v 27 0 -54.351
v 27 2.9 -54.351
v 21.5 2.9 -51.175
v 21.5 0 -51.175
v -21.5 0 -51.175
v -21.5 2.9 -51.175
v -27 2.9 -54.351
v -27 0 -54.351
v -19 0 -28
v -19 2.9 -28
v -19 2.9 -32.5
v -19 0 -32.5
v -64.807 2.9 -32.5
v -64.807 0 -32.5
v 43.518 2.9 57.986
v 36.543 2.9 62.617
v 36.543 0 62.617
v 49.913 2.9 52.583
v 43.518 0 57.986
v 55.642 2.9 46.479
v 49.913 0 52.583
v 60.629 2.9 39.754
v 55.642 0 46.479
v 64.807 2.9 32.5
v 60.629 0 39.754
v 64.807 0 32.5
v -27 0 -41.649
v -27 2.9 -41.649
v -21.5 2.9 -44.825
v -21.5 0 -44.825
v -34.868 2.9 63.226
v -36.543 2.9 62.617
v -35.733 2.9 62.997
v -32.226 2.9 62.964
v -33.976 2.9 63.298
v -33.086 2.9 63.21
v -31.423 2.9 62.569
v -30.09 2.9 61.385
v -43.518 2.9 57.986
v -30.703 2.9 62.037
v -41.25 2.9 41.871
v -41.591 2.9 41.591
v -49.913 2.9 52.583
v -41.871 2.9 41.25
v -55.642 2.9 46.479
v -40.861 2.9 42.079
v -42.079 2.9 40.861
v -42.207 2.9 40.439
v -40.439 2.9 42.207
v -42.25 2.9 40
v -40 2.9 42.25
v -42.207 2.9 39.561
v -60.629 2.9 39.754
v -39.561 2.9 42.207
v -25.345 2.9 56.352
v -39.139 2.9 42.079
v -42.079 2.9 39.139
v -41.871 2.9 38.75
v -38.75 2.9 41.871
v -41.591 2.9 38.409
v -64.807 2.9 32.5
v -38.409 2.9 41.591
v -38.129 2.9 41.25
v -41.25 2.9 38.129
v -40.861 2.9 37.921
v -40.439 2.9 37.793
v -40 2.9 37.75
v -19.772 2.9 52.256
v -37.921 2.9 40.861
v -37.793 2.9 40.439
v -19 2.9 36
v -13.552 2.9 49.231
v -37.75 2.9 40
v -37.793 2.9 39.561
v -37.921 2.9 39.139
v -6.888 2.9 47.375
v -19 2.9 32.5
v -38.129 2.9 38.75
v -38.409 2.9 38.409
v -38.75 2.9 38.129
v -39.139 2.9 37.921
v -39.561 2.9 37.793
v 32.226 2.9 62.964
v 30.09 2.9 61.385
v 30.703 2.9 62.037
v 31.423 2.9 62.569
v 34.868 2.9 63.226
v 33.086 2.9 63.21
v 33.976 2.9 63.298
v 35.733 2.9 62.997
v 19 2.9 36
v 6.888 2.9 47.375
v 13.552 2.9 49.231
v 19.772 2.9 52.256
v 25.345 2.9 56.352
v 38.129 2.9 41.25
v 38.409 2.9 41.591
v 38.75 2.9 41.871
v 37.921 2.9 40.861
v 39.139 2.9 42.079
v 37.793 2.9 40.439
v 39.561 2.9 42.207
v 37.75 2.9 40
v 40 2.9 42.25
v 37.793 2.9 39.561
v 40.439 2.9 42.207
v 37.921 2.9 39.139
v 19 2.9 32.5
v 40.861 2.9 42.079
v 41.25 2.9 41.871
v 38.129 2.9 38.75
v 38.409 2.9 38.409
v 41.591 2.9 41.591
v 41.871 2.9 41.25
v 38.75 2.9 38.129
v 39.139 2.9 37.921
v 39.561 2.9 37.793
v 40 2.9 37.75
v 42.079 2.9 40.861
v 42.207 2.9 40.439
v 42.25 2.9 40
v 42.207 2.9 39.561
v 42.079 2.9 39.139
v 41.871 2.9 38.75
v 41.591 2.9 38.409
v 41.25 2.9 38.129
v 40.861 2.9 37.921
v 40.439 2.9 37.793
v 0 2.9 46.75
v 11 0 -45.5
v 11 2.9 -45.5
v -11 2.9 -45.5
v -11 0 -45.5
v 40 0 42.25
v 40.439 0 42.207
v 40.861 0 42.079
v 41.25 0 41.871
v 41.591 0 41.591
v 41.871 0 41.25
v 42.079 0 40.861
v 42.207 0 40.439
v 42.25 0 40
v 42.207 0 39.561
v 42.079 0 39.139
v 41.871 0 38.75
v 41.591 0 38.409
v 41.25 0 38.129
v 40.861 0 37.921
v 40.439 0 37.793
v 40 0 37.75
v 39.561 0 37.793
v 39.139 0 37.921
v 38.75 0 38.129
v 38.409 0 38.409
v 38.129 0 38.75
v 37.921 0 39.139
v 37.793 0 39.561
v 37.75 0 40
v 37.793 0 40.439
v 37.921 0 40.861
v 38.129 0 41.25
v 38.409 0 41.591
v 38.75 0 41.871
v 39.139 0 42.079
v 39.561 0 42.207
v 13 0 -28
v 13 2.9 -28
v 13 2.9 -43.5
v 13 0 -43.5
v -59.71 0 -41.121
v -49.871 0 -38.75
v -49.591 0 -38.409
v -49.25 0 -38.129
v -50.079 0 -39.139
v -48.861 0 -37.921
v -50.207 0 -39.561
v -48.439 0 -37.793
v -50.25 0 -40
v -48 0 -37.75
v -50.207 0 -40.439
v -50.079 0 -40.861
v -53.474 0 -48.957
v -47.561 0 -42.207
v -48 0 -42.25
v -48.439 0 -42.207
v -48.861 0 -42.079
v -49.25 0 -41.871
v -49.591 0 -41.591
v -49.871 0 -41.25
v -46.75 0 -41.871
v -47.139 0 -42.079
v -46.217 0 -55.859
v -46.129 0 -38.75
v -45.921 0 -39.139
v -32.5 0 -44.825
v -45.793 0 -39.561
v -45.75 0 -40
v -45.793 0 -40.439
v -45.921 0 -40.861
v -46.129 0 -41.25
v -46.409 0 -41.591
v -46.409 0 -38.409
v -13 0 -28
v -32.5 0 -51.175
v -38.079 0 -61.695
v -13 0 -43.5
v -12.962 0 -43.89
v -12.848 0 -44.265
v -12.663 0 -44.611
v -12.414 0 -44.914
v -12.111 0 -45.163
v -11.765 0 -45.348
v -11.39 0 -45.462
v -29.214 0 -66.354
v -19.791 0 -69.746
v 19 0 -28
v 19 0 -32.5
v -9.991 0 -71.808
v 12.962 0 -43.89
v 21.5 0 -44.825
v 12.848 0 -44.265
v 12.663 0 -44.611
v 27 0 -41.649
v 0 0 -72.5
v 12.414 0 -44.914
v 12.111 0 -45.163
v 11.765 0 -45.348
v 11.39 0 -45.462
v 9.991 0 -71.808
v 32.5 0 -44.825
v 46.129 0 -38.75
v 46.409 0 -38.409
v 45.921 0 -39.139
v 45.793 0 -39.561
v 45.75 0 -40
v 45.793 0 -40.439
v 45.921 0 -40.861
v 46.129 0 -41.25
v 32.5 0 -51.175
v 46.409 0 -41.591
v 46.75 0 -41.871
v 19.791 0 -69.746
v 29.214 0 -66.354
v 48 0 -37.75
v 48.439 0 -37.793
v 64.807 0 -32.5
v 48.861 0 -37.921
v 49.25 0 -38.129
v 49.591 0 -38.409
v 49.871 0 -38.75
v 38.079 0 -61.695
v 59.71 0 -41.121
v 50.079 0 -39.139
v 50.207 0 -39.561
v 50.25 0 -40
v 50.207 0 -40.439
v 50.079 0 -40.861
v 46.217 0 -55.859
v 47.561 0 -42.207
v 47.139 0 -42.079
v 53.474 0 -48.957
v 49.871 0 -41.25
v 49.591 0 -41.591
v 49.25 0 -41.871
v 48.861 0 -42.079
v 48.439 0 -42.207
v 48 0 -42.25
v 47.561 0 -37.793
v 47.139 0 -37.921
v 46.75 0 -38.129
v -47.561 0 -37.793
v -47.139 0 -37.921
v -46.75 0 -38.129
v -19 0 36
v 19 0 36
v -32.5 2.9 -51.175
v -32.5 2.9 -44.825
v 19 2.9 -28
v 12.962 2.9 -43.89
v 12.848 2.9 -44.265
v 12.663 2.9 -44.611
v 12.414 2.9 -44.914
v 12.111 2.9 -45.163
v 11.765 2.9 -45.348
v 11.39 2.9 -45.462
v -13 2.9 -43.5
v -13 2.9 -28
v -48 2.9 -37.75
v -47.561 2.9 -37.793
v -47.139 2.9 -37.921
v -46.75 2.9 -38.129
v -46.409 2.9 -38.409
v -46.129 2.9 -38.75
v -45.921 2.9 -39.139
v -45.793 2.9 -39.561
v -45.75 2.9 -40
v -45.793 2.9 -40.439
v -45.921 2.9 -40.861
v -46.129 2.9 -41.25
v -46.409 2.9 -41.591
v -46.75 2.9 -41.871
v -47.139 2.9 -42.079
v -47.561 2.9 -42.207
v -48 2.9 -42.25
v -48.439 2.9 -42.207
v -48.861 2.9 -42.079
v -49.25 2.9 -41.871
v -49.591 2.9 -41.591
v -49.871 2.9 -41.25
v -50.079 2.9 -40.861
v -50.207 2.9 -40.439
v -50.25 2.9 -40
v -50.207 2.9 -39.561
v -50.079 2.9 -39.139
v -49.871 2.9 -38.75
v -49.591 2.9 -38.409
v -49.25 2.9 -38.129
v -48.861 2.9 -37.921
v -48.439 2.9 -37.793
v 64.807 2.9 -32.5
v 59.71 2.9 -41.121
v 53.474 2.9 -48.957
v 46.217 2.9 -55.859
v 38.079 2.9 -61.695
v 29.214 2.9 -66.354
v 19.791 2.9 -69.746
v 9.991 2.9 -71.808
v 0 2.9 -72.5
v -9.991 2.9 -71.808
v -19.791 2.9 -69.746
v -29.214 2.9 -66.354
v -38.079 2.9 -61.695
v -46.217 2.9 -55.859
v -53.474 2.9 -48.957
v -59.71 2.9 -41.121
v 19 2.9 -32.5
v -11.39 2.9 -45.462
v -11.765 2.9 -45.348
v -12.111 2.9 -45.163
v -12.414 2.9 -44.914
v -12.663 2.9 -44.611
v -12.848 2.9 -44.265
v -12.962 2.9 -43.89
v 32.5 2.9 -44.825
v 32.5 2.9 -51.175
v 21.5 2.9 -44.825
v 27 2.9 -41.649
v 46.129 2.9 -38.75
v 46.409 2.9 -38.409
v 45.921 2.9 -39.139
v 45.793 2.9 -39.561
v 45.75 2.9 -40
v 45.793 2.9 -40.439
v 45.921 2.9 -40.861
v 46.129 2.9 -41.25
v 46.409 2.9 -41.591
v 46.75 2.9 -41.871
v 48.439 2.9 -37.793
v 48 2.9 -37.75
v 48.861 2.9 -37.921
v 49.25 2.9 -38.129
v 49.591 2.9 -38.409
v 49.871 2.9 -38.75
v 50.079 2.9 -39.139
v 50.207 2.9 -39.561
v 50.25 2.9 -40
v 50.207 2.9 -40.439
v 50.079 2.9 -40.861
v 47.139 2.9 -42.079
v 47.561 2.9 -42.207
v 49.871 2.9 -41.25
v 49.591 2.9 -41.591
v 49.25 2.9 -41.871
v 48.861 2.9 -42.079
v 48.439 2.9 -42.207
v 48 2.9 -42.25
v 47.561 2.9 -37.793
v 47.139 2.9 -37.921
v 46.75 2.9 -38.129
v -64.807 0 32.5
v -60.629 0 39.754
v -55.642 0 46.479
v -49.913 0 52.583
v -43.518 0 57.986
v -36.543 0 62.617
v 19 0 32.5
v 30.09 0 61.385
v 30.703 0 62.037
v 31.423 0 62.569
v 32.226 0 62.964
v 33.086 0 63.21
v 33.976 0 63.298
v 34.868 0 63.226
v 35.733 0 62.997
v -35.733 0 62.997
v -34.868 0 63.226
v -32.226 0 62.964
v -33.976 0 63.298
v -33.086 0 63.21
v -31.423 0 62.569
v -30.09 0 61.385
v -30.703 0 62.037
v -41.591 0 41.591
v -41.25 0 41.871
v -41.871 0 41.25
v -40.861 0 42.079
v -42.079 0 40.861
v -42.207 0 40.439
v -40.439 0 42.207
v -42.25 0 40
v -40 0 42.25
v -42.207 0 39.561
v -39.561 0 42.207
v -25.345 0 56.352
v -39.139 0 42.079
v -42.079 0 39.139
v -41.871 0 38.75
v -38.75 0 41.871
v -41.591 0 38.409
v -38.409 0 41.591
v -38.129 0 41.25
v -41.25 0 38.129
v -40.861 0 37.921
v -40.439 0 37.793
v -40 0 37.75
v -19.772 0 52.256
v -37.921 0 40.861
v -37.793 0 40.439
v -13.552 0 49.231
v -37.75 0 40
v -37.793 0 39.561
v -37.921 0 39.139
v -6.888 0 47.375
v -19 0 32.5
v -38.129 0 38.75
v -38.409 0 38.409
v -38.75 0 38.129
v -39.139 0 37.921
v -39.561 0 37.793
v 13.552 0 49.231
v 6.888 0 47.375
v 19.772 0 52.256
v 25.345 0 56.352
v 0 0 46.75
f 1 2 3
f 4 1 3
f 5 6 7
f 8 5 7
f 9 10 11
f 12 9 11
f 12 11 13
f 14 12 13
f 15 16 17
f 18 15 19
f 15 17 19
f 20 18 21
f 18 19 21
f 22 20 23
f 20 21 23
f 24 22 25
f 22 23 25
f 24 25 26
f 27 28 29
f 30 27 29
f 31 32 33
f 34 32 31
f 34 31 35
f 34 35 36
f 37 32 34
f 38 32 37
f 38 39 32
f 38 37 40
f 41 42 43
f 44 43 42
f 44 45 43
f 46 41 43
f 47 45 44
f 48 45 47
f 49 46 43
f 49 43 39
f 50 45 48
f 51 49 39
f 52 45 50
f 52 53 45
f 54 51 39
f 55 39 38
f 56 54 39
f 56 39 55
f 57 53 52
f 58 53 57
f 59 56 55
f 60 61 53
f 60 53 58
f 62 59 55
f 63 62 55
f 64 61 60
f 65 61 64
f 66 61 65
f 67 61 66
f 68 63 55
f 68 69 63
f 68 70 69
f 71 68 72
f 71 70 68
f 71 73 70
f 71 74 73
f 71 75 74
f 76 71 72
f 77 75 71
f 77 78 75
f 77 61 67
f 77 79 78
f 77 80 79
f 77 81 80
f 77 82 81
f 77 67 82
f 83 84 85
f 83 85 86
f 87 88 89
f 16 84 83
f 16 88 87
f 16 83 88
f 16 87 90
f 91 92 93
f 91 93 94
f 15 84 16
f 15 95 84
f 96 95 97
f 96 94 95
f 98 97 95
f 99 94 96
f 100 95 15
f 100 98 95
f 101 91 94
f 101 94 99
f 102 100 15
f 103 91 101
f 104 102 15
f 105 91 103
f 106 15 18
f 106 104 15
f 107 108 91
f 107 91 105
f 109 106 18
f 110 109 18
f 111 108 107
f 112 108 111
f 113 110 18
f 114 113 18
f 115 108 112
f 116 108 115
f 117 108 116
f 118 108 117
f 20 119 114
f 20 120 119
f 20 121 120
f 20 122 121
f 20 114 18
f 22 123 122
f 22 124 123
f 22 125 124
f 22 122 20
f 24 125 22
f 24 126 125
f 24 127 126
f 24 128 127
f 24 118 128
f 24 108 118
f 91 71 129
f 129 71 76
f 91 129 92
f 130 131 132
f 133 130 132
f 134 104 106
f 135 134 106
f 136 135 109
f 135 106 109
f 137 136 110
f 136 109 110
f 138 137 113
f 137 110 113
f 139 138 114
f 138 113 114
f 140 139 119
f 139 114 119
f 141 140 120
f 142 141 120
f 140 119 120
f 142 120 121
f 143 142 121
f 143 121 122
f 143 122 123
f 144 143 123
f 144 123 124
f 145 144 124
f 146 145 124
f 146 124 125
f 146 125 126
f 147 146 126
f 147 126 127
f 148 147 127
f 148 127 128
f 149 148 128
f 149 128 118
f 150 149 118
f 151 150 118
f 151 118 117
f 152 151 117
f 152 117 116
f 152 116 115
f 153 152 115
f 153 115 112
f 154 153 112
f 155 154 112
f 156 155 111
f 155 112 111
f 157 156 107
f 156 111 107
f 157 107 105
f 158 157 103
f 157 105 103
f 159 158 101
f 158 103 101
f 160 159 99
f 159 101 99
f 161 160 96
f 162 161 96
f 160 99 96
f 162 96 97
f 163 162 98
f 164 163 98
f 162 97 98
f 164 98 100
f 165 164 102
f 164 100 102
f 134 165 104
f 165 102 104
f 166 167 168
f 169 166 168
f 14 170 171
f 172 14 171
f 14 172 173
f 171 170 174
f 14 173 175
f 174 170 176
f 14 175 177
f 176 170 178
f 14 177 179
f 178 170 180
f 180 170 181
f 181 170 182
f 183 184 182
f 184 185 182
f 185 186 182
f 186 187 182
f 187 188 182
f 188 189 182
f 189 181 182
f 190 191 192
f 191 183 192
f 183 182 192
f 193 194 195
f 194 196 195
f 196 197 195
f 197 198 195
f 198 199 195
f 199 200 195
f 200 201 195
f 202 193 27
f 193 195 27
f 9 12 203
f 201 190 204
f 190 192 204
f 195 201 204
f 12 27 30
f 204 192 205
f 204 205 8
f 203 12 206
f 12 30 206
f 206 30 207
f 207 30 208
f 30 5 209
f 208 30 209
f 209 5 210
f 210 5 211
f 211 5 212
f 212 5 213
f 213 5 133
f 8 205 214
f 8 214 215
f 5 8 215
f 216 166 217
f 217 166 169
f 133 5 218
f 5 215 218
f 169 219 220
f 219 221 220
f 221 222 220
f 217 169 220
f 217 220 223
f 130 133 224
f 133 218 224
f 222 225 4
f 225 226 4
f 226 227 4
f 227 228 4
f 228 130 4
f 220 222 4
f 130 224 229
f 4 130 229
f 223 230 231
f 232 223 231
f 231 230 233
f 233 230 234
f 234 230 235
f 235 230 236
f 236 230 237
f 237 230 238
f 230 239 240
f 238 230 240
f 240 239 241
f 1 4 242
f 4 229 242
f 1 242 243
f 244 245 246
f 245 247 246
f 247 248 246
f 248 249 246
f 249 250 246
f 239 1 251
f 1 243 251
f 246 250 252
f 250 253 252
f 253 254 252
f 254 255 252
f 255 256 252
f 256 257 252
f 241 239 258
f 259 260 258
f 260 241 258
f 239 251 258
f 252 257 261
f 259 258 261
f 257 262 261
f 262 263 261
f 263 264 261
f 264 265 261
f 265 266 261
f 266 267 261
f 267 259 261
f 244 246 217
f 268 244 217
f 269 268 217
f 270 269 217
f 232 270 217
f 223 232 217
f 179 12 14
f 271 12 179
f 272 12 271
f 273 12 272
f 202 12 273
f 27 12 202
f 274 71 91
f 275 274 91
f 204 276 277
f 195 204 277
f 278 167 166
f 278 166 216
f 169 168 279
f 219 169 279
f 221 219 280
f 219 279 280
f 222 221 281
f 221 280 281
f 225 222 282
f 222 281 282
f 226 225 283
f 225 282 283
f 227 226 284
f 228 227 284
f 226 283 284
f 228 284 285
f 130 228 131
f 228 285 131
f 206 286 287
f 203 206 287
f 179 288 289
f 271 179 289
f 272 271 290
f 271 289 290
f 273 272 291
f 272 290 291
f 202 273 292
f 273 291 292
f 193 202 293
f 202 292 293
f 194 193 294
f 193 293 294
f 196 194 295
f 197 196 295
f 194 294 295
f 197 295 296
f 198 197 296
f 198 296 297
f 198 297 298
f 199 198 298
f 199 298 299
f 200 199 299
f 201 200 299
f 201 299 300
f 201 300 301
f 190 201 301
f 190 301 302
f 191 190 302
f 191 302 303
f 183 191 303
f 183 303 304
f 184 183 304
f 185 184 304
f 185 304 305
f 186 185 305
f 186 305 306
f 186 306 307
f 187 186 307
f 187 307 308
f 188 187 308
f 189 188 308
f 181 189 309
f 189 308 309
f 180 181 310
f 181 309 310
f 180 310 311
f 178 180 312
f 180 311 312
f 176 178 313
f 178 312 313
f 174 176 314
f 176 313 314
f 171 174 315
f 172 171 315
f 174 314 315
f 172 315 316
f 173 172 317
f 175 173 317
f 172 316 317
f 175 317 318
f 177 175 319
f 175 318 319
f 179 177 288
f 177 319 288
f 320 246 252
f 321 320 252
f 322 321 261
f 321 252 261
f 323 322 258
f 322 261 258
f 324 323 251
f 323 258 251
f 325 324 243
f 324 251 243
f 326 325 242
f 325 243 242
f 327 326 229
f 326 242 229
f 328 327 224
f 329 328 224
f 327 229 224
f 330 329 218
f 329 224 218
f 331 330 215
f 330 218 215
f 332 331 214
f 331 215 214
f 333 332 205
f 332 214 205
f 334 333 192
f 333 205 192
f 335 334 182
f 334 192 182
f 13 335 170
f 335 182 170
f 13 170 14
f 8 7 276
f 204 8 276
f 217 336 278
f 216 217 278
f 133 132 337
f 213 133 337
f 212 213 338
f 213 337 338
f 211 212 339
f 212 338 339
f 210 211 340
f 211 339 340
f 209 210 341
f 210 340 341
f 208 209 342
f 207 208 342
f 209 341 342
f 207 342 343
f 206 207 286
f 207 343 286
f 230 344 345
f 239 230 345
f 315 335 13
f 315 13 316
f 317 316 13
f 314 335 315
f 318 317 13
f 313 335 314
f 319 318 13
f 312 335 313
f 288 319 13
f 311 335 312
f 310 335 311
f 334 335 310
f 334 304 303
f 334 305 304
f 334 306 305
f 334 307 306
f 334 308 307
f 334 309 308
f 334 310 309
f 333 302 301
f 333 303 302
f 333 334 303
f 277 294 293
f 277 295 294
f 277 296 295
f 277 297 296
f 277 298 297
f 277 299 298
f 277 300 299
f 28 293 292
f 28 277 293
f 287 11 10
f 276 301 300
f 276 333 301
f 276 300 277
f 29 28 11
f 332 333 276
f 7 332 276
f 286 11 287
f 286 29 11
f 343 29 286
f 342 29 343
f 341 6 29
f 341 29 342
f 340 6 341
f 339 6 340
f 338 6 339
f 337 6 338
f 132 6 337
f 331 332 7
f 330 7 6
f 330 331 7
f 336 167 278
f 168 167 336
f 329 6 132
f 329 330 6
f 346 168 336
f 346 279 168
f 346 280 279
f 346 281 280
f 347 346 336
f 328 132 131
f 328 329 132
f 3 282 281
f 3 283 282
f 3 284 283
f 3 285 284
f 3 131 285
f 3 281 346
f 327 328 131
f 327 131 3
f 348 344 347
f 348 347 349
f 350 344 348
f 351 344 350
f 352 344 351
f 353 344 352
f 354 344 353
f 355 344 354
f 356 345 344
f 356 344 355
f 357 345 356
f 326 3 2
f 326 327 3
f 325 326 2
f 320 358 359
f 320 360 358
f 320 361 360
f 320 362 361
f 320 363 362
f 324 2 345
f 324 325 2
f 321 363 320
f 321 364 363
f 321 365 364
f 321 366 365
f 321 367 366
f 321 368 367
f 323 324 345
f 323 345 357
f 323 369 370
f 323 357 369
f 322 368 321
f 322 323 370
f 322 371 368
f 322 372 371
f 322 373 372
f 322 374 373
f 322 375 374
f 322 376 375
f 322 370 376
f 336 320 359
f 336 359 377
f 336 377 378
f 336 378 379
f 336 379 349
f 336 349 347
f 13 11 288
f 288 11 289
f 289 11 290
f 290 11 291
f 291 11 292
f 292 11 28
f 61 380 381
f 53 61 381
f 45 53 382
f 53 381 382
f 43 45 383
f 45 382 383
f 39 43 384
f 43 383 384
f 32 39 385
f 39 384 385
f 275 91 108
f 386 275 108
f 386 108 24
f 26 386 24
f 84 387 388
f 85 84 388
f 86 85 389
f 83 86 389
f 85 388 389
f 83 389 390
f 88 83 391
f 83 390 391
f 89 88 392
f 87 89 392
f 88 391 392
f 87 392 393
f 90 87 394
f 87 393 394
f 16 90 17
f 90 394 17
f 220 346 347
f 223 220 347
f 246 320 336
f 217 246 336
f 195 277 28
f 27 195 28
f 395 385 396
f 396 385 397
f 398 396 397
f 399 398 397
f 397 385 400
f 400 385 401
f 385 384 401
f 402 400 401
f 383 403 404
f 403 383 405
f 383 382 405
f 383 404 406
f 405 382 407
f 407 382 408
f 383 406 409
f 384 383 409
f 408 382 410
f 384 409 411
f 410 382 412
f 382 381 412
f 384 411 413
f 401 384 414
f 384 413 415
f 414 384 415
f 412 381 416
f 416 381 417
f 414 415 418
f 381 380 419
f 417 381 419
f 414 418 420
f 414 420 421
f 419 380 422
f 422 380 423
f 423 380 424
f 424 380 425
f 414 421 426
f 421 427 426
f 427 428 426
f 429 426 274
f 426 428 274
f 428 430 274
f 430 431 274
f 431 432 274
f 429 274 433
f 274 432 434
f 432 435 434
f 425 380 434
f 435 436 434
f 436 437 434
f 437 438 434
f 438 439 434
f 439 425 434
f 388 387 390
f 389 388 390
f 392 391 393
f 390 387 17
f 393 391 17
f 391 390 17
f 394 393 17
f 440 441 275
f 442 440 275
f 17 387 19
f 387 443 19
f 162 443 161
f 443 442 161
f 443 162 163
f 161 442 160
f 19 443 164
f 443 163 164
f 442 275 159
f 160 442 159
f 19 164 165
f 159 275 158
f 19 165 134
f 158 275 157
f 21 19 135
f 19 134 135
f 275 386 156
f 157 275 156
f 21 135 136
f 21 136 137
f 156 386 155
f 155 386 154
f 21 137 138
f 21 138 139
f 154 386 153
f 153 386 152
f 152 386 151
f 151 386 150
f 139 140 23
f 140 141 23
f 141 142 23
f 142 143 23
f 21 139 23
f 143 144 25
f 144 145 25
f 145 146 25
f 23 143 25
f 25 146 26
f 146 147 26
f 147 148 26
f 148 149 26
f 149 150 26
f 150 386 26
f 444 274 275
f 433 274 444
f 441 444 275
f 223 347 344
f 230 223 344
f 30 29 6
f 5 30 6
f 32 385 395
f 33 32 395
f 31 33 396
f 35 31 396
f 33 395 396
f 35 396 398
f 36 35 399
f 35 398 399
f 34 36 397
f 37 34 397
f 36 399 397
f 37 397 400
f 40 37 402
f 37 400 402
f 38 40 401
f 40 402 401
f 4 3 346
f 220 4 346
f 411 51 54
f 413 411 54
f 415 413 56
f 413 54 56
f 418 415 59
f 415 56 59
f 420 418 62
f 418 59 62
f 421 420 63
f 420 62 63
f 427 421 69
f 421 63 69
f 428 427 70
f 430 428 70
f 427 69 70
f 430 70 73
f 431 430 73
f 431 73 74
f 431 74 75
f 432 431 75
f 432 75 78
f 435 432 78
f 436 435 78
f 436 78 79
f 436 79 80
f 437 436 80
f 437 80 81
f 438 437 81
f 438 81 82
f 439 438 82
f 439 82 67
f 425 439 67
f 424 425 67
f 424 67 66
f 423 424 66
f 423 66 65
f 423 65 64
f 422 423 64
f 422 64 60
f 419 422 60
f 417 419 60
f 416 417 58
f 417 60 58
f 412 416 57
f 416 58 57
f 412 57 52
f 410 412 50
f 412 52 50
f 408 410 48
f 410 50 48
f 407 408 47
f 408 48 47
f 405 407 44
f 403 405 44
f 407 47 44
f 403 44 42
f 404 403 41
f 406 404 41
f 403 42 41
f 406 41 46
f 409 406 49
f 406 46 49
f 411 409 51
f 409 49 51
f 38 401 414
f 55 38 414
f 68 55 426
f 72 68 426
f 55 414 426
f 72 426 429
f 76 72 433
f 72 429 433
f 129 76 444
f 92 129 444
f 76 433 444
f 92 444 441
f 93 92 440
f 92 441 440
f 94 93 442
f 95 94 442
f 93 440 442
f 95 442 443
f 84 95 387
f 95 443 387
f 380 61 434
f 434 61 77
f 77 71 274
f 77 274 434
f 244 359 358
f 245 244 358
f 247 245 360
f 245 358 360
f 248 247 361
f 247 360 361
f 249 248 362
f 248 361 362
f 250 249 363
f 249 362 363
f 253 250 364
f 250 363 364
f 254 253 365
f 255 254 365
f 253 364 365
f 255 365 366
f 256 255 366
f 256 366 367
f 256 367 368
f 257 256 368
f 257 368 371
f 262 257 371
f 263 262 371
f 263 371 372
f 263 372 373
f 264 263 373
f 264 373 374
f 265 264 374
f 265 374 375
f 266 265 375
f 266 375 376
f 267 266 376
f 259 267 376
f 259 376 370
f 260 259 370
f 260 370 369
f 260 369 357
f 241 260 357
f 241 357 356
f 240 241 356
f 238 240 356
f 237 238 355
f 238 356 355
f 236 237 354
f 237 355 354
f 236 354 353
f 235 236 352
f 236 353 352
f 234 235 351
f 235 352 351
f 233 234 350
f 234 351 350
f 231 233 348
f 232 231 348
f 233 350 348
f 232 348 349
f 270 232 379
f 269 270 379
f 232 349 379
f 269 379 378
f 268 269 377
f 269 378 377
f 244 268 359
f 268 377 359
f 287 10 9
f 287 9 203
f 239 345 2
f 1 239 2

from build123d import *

# Parameters (mm, degrees)
BOSS_EXTRUDE1_DEPTH  = 2.9
SOLENOID_PLACEMENT_W = 38
SOLENOID_PLACEMENT_H = 64
CUT_EXTRUDE1_DEPTH   = 103.571487266
CUT_EXTRUDE5_DEPTH   = 103.571487266
SKETCH6_R            = 2.25
CUT_EXTRUDE6_DEPTH   = 103.571487266
CUT_EXTRUDE3_DEPTH   = 103.571487266
CUT_EXTRUDE7_DEPTH   = 98.286484159


with BuildPart() as part:
    # Sketch1 → Boss-Extrude1 (new body)
    with BuildSketch(Plane(origin=(0, 0, 0), x_dir=(1, 0, 0), z_dir=(0, 1, 0))):
        with BuildLine():
            ThreePointArc((36.543377003, -62.616544118), (0, 72.5), (-36.543377003, -62.616544118))
            ThreePointArc((-36.543377003, -62.616544118), (-33.085954668, -63.20954405), (-30.089832649, -61.38507948))
            ThreePointArc((-30.089832649, -61.38507948), (0, -46.75), (30.089832649, -61.38507948))
            ThreePointArc((30.089832649, -61.38507948), (33.085954668, -63.20954405), (36.543377003, -62.616544118))
        make_face()
    extrude(amount=BOSS_EXTRUDE1_DEPTH)

    # solenoid placement → Cut-Extrude1 (cut, through all)
    with BuildSketch(Plane(origin=(0, 2.9, 0), x_dir=(1, 0, 0), z_dir=(0, 1, 0))):
        with Locations((0, -4)):
            Rectangle(SOLENOID_PLACEMENT_W, SOLENOID_PLACEMENT_H)
    extrude(amount=-CUT_EXTRUDE1_DEPTH, mode=Mode.SUBTRACT)

    # Sketch5 → Cut-Extrude5 (cut, through all)
    with BuildSketch(Plane(origin=(0, 2.9, 0), x_dir=(1, 0, 0), z_dir=(0, 1, 0))):
        Polygon((-21.5, 51.175426481), (-27, 54.350852961), (-32.5, 51.175426481), (-32.5, 44.824573519), (-27, 41.649147039), (-21.5, 44.824573519), align=None)
        Polygon((21.5, 51.175426481), (21.5, 44.824573519), (27, 41.649147039), (32.5, 44.824573519), (32.5, 51.175426481), (27, 54.350852961), align=None)
    extrude(amount=-CUT_EXTRUDE5_DEPTH, mode=Mode.SUBTRACT)

    # Sketch6 → Cut-Extrude6 (cut, through all)
    with BuildSketch(Plane(origin=(0, 2.9, 0), x_dir=(1, 0, 0), z_dir=(0, 1, 0))):
        with Locations(Location((48, 40, 0), (0, 0, 270))):
            Circle(SKETCH6_R)
        with Locations(Location((-48, 40, 0), (0, 0, 270))):
            Circle(SKETCH6_R)
        with Locations(Location((40, -40, 0), (0, 0, 270))):
            Circle(SKETCH6_R)
        with Locations(Location((-40, -40, 0), (0, 0, 270))):
            Circle(SKETCH6_R)
    extrude(amount=-CUT_EXTRUDE6_DEPTH, mode=Mode.SUBTRACT)

    # Sketch3 → Cut-Extrude3 (cut, through all)
    with BuildSketch(Plane(origin=(0, 2.9, 0), x_dir=(1, 0, 0), z_dir=(0, 1, 0))):
        Polygon((-19, 28), (-19, 32.5), (-72.5, 32.5), (-72.5, -32.5), (72.5, -32.5), (72.5, 32.5), (19, 32.5), (19, 28), align=None)
    extrude(amount=-CUT_EXTRUDE3_DEPTH, mode=Mode.SUBTRACT)


with BuildPart() as cut_extrude3_piece_1:
    # of the separate pieces the step leaves, piece 1, a body of its own (cut_extrude3_pieces)
    add(part.part.solids().sort_by_distance((64.807406984, 0, -32.5))[0])

    # Sketch7 → Cut-Extrude7 (cut, through all)
    with BuildSketch(Plane(origin=(0, 2.9, 0), x_dir=(1, 0, 0), z_dir=(0, 1, 0))):
        with BuildLine():
            Line((13, 28), (13, 43.5))
            ThreePointArc((13, 43.5), (12.414213562, 44.914213562), (11, 45.5))
            Line((11, 45.5), (-11, 45.5))
            ThreePointArc((-11, 45.5), (-12.414213562, 44.914213562), (-13, 43.5))
            Line((-13, 43.5), (-13, 28))
            Line((-13, 28), (13, 28))
        make_face()
    extrude(amount=-CUT_EXTRUDE7_DEPTH, mode=Mode.SUBTRACT)


with BuildPart() as cut_extrude3_piece_2:
    # of the separate pieces the step leaves, piece 2, a body of its own (cut_extrude3_pieces)
    add(part.part.solids().sort_by_distance((-36.543377003, 0, 62.616544118))[0])


solid = Compound([cut_extrude3_piece_1.part, cut_extrude3_piece_2.part])
